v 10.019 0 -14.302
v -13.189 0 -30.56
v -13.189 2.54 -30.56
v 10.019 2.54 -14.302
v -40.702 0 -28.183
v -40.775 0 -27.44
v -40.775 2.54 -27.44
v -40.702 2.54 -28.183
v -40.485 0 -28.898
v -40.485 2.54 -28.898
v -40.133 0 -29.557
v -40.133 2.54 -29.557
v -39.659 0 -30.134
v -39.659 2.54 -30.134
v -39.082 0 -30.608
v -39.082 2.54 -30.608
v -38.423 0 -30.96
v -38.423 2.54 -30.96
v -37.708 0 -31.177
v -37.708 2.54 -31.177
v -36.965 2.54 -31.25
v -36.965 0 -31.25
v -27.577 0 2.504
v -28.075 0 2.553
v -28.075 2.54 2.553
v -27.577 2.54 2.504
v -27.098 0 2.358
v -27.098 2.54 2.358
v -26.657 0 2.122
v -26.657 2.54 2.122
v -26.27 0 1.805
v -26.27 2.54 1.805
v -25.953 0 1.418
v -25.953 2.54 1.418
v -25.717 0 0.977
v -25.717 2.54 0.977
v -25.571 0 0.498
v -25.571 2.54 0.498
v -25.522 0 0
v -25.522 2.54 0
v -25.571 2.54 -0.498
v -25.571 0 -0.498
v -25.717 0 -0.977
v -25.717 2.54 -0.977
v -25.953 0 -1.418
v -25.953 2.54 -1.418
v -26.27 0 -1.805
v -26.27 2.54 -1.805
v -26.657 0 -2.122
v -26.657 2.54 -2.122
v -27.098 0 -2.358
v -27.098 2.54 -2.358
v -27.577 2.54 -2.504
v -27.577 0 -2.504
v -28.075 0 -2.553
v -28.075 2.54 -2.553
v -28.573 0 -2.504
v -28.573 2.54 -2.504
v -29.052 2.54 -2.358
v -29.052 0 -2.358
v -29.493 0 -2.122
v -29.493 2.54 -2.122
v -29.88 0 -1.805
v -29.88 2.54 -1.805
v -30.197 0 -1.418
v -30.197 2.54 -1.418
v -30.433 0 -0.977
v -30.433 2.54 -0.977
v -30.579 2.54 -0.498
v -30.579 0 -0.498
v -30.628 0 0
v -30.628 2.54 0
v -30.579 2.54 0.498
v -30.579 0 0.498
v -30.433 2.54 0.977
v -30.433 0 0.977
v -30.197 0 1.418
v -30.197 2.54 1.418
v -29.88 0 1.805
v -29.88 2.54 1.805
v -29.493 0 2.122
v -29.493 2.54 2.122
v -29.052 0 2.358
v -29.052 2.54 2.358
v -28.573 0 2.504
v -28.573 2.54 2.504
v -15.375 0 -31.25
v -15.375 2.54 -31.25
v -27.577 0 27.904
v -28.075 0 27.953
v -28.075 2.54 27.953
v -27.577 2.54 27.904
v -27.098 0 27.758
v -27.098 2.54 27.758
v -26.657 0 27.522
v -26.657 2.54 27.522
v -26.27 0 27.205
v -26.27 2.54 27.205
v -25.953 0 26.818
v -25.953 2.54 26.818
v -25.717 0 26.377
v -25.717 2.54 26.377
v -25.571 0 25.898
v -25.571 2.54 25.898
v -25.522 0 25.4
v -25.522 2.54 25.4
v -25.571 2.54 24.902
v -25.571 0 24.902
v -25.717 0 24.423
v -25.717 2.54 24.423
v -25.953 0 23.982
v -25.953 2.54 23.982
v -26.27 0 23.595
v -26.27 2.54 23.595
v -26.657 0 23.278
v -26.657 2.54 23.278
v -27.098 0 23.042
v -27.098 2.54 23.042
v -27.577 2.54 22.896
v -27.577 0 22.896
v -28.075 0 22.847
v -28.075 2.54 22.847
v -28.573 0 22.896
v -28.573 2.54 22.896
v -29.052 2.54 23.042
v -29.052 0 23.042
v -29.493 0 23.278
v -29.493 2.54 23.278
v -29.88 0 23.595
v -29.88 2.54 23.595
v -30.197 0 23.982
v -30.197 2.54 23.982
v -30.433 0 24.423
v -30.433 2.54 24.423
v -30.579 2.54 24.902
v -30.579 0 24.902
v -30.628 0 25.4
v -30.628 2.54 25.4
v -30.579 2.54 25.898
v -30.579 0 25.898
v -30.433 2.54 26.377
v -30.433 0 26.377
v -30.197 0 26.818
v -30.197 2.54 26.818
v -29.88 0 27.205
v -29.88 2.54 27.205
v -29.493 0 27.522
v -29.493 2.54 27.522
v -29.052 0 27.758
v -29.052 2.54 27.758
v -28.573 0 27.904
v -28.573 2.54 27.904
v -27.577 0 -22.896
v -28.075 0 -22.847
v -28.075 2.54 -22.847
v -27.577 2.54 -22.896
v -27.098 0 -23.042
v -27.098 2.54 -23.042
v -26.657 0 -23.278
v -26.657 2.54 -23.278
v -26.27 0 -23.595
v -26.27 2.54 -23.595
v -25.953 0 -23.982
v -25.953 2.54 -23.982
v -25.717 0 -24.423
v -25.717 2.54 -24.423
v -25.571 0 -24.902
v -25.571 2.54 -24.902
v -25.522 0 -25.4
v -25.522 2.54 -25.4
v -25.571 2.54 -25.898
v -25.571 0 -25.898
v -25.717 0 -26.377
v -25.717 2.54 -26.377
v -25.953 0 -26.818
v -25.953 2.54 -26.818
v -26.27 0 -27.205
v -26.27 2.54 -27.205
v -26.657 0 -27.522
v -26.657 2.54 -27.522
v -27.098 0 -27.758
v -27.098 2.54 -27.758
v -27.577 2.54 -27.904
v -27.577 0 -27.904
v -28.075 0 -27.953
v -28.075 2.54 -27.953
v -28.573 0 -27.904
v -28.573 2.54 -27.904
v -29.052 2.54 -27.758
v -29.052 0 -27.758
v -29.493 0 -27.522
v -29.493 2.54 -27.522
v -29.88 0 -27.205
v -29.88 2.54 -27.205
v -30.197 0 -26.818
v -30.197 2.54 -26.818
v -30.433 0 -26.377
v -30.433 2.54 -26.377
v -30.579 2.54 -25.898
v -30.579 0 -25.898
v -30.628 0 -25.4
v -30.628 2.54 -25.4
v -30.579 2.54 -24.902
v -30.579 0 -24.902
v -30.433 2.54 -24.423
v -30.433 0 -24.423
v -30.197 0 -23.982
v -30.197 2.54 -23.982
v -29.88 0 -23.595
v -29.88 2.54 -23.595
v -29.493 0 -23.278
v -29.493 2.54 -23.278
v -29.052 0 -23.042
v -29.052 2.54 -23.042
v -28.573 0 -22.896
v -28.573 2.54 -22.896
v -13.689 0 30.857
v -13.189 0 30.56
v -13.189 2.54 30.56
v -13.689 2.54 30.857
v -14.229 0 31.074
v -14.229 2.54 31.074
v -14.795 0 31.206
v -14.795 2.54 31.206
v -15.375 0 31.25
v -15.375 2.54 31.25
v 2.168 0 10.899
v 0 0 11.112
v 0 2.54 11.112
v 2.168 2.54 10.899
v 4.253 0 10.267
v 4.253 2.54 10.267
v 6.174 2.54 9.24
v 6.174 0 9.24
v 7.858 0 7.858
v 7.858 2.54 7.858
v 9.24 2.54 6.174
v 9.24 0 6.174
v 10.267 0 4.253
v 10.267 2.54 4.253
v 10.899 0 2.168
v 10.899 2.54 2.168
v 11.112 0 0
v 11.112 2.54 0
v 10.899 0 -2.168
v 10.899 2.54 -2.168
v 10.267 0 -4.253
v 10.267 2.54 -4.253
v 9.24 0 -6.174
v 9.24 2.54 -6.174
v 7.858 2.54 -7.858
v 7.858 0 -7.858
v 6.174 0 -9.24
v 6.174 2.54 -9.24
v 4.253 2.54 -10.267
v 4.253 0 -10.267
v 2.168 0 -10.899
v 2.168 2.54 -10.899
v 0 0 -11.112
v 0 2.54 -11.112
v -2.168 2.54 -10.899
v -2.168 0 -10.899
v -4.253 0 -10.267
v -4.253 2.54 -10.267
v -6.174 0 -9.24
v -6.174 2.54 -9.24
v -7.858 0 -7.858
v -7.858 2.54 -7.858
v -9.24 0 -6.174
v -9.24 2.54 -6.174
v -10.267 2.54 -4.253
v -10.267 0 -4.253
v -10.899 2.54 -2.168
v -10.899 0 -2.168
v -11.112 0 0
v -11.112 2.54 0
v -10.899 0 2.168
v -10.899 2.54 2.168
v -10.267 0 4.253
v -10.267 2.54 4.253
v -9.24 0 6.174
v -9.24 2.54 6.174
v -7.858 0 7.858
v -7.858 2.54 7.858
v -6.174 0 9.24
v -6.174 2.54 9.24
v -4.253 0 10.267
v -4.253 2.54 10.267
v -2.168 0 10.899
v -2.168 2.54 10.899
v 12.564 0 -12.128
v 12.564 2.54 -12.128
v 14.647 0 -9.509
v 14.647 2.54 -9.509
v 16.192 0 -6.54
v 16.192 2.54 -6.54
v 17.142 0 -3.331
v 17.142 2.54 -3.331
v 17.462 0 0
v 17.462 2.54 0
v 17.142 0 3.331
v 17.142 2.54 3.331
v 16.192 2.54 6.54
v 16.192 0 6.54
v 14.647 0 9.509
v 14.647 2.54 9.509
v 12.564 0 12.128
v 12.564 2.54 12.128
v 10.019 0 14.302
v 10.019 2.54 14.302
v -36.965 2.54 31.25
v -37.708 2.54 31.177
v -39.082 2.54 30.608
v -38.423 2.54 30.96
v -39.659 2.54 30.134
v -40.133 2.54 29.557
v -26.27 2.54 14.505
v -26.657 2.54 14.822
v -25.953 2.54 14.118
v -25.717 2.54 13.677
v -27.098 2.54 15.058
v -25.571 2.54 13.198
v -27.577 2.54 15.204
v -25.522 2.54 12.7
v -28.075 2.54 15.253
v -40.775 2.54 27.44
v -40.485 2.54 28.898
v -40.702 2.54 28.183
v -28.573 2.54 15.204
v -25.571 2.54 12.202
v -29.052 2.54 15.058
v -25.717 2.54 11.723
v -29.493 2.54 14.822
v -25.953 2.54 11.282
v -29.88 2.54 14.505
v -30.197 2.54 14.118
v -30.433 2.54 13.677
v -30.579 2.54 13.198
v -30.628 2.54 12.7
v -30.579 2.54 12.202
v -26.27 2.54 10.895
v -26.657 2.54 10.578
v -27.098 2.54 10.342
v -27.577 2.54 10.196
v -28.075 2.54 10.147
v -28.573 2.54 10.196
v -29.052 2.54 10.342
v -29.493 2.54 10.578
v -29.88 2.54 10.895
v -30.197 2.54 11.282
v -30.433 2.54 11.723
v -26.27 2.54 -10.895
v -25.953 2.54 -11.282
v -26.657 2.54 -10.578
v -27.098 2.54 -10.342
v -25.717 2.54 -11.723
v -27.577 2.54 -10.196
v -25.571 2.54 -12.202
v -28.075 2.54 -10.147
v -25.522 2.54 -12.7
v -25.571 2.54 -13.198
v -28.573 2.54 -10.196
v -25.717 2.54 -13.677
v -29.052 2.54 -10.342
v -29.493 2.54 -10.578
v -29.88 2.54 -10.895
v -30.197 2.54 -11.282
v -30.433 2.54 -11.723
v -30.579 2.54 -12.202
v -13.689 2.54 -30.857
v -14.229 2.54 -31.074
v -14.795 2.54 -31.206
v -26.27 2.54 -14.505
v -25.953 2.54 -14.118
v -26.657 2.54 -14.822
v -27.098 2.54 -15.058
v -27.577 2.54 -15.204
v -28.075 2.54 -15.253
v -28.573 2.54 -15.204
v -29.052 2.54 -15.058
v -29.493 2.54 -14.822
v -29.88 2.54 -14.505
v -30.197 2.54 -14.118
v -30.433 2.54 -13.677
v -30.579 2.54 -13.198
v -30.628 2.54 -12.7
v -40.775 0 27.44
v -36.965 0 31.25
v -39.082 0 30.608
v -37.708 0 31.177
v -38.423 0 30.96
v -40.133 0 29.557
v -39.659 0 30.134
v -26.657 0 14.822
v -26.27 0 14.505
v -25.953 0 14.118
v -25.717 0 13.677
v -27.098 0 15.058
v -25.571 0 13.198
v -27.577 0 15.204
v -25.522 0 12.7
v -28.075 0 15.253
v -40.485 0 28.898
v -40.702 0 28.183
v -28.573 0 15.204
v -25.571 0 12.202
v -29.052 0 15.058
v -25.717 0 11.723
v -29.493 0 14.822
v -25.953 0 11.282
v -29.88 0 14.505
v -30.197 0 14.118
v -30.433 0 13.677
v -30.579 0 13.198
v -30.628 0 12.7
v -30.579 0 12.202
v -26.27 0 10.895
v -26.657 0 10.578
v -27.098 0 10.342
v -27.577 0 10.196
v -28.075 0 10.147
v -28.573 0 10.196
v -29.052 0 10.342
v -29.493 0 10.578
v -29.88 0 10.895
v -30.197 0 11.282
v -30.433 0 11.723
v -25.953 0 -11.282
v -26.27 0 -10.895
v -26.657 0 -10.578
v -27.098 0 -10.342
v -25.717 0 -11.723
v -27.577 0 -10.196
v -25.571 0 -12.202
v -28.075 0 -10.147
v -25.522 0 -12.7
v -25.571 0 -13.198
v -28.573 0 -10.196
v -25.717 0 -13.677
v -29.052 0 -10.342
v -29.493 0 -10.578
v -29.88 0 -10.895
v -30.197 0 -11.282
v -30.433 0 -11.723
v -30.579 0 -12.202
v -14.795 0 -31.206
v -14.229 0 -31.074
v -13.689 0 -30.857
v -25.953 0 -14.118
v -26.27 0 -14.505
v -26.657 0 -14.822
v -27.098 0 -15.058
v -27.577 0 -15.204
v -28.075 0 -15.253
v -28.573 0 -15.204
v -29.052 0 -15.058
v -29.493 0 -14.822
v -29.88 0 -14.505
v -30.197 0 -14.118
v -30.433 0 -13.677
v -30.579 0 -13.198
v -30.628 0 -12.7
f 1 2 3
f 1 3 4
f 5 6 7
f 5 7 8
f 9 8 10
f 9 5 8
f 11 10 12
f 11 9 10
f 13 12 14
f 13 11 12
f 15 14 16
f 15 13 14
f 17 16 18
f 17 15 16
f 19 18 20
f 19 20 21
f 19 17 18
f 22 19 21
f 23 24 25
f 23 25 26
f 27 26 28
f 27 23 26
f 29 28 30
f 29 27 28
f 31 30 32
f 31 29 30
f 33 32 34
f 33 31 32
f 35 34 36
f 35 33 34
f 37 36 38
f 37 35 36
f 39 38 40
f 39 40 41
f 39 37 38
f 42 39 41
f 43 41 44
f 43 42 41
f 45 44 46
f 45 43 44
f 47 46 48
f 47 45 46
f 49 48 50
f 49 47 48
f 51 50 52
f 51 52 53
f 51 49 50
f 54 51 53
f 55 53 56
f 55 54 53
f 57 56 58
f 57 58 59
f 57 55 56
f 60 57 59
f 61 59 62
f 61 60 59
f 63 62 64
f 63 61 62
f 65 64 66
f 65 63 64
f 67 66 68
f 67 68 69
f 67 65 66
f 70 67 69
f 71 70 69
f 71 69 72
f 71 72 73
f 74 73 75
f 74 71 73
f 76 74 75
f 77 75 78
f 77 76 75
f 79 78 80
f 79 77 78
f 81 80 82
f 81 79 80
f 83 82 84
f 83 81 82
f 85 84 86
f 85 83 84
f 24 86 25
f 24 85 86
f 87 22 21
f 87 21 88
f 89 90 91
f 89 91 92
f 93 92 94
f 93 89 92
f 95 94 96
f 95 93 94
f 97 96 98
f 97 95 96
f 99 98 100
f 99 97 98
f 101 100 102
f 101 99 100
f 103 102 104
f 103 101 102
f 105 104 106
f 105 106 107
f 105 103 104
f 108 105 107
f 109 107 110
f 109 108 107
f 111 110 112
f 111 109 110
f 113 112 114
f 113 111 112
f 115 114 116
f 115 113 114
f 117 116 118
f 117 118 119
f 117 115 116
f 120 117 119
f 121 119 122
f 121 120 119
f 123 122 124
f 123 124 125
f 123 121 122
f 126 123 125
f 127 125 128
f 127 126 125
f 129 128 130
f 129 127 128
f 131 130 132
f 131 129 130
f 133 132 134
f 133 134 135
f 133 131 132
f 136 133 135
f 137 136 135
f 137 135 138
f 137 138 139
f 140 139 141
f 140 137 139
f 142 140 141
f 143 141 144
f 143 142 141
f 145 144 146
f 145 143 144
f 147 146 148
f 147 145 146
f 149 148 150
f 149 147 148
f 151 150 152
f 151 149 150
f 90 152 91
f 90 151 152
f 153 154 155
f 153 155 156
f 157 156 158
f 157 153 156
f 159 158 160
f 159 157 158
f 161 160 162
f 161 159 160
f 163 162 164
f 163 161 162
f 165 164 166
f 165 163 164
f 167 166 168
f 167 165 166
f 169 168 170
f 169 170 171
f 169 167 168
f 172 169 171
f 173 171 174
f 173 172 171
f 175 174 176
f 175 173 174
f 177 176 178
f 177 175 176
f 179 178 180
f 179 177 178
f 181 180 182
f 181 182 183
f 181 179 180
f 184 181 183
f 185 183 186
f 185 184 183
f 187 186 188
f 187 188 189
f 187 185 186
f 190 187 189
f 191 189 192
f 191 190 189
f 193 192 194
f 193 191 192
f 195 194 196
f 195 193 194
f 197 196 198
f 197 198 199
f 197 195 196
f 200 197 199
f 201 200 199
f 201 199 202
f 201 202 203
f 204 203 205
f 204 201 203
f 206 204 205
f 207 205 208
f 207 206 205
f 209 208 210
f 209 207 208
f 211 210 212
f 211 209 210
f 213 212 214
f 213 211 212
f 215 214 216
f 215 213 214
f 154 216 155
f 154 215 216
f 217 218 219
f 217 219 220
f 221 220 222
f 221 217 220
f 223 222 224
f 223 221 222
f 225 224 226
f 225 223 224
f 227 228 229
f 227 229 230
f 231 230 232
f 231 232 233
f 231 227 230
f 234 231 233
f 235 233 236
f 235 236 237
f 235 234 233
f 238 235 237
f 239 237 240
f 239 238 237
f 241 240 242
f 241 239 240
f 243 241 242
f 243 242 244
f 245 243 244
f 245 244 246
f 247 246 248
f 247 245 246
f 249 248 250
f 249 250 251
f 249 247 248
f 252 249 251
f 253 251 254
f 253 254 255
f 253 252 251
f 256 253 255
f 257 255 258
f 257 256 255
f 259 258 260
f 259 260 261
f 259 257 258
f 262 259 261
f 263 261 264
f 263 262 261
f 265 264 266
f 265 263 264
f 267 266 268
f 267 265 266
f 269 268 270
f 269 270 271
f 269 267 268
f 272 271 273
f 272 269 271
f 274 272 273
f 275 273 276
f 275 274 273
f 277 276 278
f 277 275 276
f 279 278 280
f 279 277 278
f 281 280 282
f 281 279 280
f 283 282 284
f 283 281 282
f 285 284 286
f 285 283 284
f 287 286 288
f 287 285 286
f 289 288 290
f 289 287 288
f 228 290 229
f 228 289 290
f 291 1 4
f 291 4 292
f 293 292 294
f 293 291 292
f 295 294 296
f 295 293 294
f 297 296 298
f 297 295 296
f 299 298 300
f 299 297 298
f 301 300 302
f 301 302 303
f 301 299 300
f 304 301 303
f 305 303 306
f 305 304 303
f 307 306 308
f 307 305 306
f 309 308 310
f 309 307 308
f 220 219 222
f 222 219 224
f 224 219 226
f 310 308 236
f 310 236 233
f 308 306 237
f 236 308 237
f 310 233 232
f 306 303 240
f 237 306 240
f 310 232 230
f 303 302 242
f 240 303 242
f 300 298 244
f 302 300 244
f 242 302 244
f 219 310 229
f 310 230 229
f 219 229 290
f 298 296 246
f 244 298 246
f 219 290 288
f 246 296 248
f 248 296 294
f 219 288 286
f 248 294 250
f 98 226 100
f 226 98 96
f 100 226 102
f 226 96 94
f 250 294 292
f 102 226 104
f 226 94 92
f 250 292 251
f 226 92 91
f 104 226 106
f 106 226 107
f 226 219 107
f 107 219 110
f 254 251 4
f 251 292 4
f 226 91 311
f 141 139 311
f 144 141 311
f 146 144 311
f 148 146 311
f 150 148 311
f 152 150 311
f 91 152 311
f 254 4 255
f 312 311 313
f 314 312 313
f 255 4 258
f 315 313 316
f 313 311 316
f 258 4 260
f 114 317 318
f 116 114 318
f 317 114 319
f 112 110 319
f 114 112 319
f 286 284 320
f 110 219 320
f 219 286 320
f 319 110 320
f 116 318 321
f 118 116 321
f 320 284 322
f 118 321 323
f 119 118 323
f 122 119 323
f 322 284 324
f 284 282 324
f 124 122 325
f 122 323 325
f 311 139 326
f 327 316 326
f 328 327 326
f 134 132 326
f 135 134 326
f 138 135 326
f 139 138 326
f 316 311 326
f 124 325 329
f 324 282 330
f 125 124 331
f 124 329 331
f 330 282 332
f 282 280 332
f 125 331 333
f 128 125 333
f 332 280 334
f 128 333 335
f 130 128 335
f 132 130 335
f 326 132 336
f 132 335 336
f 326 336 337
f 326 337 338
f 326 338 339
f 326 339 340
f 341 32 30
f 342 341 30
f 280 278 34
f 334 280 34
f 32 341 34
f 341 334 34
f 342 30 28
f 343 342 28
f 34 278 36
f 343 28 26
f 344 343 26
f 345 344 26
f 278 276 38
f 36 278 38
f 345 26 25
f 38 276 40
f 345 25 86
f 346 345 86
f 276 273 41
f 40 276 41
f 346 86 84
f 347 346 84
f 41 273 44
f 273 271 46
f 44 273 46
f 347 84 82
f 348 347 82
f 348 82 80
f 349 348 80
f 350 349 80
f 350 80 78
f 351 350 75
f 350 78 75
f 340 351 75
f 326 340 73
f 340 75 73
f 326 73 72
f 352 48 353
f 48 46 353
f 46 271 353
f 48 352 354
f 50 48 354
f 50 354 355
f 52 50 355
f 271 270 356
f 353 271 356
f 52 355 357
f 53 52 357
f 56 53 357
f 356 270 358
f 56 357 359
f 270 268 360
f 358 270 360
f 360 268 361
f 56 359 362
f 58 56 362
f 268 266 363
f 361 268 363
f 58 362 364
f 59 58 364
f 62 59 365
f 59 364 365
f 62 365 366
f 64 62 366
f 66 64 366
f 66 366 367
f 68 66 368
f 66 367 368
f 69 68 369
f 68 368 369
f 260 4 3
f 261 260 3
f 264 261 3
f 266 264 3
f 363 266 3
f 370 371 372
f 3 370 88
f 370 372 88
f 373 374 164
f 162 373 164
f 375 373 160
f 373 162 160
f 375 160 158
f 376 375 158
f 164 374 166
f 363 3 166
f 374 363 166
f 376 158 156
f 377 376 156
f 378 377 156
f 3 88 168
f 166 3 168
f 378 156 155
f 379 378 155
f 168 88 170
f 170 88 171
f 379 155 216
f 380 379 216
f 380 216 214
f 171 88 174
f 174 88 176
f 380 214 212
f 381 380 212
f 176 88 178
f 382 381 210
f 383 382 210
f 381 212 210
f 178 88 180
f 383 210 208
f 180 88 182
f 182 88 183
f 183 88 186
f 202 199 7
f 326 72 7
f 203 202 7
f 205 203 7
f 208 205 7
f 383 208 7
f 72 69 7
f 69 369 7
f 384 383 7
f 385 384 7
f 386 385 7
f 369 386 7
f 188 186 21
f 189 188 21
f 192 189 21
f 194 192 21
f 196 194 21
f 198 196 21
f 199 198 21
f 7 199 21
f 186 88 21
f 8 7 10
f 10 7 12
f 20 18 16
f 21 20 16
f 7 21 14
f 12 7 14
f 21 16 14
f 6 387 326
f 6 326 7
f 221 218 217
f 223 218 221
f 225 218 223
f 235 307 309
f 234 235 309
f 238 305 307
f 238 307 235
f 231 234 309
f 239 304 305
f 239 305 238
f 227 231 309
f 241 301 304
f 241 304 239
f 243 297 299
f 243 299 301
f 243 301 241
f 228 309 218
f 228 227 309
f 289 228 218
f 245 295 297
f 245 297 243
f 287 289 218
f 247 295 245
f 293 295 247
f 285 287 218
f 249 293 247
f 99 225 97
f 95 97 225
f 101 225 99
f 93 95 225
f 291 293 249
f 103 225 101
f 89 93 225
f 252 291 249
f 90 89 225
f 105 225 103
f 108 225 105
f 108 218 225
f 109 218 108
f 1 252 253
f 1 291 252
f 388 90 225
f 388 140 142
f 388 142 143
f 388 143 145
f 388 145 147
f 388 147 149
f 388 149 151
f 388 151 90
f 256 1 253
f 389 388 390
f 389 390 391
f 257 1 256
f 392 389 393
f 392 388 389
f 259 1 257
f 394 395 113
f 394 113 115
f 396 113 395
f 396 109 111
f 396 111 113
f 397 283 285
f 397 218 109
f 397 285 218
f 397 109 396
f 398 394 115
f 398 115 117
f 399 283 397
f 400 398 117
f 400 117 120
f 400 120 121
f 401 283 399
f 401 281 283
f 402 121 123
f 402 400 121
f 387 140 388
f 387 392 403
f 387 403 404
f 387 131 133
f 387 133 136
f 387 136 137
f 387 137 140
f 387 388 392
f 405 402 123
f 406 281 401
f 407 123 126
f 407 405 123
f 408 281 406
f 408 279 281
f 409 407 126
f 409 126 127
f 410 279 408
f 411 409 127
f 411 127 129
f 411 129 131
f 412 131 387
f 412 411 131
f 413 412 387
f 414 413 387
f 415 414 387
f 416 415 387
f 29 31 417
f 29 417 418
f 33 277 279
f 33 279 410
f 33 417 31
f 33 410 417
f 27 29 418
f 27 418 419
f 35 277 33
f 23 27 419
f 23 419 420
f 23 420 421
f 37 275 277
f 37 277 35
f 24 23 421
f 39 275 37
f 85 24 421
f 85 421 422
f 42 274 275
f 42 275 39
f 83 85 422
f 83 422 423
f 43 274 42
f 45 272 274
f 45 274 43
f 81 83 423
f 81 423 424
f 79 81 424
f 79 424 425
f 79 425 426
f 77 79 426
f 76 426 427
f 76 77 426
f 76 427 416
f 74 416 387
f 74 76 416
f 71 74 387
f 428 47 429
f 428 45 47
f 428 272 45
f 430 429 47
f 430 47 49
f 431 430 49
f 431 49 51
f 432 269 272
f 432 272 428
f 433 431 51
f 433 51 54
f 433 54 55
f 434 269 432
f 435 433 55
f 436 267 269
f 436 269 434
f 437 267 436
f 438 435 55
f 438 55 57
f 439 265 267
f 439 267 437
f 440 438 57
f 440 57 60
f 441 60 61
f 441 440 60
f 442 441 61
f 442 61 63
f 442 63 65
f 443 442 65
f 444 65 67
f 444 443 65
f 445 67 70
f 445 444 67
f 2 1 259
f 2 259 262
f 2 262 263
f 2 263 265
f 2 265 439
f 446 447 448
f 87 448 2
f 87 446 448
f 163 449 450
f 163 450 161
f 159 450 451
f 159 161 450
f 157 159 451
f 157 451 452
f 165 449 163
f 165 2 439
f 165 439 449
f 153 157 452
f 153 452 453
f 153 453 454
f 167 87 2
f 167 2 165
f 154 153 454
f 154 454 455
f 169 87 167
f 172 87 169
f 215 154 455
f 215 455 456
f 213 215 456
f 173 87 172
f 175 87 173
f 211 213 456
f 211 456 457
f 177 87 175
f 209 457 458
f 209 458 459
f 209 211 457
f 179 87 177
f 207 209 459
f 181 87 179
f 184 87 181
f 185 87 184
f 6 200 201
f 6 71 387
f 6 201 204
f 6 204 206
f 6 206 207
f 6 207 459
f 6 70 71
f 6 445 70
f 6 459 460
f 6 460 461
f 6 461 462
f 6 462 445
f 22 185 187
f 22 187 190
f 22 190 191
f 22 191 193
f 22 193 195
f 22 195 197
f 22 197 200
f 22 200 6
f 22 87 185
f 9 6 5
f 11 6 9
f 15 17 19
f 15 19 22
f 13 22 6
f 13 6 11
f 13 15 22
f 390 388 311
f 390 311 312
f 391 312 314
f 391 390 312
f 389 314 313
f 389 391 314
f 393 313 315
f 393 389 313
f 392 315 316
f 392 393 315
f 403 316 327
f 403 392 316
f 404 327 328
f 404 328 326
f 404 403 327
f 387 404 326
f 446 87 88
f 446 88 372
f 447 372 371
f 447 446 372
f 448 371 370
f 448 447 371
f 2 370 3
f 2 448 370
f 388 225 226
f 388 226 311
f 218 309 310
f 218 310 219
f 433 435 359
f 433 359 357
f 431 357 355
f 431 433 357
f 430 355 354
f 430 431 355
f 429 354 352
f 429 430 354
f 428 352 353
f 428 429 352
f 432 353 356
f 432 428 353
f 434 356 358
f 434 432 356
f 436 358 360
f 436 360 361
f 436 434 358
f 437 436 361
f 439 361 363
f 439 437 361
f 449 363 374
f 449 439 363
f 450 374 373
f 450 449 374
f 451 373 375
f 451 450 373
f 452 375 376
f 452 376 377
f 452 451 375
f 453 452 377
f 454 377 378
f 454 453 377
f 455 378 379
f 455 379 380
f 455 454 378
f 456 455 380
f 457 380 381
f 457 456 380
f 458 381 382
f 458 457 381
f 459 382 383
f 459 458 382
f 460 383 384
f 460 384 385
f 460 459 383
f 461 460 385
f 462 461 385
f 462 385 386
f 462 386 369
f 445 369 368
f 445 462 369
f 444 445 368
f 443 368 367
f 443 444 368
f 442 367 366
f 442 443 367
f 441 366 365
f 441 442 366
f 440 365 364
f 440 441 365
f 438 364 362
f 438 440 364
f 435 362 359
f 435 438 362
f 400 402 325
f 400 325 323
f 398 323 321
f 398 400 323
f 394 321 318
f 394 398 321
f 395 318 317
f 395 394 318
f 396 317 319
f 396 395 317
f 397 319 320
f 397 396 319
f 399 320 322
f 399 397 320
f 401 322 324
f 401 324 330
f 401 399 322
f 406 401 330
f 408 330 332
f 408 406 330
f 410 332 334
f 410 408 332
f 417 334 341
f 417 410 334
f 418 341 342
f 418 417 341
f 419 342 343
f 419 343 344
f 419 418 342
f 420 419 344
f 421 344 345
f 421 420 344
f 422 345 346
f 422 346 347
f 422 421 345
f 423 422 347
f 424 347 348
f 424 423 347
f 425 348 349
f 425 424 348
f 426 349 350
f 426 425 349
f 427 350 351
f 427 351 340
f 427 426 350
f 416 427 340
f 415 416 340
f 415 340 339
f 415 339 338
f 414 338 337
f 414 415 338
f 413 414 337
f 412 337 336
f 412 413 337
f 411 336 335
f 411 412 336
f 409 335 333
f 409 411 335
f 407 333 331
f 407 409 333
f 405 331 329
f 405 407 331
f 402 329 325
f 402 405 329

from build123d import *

# Parameters (mm, degrees)
SKETCH1_R           = 11.1125
SKETCH1_R_2         = 2.5527
BOSS_EXTRUDE1_DEPTH = 2.54


with BuildPart() as part:
    # Sketch1 → Boss-Extrude1 (new body)
    with BuildSketch(Plane(origin=(0, 0, 0), x_dir=(1, 0, 0), z_dir=(0, 1, 0))):
        with BuildLine():
            Line((-40.775, -27.44), (-40.775, 27.44))
            ThreePointArc((-40.775, 27.44), (-39.659076836, 30.134076836), (-36.965, 31.25))
            Line((-36.965, 31.25), (-15.375, 31.25))
            ThreePointArc((-15.375, 31.25), (-14.228907316, 31.073534307), (-13.188980532, 30.560483758))
            Line((-13.188980532, 30.560483758), (10.019255896, 14.302217225))
            ThreePointArc((10.019255896, 14.302217225), (17.4625, 0), (10.019255896, -14.302217225))
            Line((10.019255896, -14.302217225), (-13.188980532, -30.560483758))
            ThreePointArc((-13.188980532, -30.560483758), (-14.228907316, -31.073534307), (-15.375, -31.25))
            Line((-15.375, -31.25), (-36.965, -31.25))
            ThreePointArc((-36.965, -31.25), (-39.659076836, -30.134076836), (-40.775, -27.44))
        make_face()
        with Locations(Location((0, 0, 0), (0, 0, 270))):
            Circle(SKETCH1_R, mode=Mode.SUBTRACT)
        with Locations(Location((-28.075, 25.4, 0), (0, 0, 270))):
            Circle(SKETCH1_R_2, mode=Mode.SUBTRACT)
        with Locations(Location((-28.075, 12.7, 0), (0, 0, 270))):
            Circle(SKETCH1_R_2, mode=Mode.SUBTRACT)
        with Locations(Location((-28.075, 0, 0), (0, 0, 270))):
            Circle(SKETCH1_R_2, mode=Mode.SUBTRACT)
        with Locations(Location((-28.075, -12.7, 0), (0, 0, 270))):
            Circle(SKETCH1_R_2, mode=Mode.SUBTRACT)
        with Locations(Location((-28.075, -25.4, 0), (0, 0, 270))):
            Circle(SKETCH1_R_2, mode=Mode.SUBTRACT)
    extrude(amount=BOSS_EXTRUDE1_DEPTH)


solid = part.part
